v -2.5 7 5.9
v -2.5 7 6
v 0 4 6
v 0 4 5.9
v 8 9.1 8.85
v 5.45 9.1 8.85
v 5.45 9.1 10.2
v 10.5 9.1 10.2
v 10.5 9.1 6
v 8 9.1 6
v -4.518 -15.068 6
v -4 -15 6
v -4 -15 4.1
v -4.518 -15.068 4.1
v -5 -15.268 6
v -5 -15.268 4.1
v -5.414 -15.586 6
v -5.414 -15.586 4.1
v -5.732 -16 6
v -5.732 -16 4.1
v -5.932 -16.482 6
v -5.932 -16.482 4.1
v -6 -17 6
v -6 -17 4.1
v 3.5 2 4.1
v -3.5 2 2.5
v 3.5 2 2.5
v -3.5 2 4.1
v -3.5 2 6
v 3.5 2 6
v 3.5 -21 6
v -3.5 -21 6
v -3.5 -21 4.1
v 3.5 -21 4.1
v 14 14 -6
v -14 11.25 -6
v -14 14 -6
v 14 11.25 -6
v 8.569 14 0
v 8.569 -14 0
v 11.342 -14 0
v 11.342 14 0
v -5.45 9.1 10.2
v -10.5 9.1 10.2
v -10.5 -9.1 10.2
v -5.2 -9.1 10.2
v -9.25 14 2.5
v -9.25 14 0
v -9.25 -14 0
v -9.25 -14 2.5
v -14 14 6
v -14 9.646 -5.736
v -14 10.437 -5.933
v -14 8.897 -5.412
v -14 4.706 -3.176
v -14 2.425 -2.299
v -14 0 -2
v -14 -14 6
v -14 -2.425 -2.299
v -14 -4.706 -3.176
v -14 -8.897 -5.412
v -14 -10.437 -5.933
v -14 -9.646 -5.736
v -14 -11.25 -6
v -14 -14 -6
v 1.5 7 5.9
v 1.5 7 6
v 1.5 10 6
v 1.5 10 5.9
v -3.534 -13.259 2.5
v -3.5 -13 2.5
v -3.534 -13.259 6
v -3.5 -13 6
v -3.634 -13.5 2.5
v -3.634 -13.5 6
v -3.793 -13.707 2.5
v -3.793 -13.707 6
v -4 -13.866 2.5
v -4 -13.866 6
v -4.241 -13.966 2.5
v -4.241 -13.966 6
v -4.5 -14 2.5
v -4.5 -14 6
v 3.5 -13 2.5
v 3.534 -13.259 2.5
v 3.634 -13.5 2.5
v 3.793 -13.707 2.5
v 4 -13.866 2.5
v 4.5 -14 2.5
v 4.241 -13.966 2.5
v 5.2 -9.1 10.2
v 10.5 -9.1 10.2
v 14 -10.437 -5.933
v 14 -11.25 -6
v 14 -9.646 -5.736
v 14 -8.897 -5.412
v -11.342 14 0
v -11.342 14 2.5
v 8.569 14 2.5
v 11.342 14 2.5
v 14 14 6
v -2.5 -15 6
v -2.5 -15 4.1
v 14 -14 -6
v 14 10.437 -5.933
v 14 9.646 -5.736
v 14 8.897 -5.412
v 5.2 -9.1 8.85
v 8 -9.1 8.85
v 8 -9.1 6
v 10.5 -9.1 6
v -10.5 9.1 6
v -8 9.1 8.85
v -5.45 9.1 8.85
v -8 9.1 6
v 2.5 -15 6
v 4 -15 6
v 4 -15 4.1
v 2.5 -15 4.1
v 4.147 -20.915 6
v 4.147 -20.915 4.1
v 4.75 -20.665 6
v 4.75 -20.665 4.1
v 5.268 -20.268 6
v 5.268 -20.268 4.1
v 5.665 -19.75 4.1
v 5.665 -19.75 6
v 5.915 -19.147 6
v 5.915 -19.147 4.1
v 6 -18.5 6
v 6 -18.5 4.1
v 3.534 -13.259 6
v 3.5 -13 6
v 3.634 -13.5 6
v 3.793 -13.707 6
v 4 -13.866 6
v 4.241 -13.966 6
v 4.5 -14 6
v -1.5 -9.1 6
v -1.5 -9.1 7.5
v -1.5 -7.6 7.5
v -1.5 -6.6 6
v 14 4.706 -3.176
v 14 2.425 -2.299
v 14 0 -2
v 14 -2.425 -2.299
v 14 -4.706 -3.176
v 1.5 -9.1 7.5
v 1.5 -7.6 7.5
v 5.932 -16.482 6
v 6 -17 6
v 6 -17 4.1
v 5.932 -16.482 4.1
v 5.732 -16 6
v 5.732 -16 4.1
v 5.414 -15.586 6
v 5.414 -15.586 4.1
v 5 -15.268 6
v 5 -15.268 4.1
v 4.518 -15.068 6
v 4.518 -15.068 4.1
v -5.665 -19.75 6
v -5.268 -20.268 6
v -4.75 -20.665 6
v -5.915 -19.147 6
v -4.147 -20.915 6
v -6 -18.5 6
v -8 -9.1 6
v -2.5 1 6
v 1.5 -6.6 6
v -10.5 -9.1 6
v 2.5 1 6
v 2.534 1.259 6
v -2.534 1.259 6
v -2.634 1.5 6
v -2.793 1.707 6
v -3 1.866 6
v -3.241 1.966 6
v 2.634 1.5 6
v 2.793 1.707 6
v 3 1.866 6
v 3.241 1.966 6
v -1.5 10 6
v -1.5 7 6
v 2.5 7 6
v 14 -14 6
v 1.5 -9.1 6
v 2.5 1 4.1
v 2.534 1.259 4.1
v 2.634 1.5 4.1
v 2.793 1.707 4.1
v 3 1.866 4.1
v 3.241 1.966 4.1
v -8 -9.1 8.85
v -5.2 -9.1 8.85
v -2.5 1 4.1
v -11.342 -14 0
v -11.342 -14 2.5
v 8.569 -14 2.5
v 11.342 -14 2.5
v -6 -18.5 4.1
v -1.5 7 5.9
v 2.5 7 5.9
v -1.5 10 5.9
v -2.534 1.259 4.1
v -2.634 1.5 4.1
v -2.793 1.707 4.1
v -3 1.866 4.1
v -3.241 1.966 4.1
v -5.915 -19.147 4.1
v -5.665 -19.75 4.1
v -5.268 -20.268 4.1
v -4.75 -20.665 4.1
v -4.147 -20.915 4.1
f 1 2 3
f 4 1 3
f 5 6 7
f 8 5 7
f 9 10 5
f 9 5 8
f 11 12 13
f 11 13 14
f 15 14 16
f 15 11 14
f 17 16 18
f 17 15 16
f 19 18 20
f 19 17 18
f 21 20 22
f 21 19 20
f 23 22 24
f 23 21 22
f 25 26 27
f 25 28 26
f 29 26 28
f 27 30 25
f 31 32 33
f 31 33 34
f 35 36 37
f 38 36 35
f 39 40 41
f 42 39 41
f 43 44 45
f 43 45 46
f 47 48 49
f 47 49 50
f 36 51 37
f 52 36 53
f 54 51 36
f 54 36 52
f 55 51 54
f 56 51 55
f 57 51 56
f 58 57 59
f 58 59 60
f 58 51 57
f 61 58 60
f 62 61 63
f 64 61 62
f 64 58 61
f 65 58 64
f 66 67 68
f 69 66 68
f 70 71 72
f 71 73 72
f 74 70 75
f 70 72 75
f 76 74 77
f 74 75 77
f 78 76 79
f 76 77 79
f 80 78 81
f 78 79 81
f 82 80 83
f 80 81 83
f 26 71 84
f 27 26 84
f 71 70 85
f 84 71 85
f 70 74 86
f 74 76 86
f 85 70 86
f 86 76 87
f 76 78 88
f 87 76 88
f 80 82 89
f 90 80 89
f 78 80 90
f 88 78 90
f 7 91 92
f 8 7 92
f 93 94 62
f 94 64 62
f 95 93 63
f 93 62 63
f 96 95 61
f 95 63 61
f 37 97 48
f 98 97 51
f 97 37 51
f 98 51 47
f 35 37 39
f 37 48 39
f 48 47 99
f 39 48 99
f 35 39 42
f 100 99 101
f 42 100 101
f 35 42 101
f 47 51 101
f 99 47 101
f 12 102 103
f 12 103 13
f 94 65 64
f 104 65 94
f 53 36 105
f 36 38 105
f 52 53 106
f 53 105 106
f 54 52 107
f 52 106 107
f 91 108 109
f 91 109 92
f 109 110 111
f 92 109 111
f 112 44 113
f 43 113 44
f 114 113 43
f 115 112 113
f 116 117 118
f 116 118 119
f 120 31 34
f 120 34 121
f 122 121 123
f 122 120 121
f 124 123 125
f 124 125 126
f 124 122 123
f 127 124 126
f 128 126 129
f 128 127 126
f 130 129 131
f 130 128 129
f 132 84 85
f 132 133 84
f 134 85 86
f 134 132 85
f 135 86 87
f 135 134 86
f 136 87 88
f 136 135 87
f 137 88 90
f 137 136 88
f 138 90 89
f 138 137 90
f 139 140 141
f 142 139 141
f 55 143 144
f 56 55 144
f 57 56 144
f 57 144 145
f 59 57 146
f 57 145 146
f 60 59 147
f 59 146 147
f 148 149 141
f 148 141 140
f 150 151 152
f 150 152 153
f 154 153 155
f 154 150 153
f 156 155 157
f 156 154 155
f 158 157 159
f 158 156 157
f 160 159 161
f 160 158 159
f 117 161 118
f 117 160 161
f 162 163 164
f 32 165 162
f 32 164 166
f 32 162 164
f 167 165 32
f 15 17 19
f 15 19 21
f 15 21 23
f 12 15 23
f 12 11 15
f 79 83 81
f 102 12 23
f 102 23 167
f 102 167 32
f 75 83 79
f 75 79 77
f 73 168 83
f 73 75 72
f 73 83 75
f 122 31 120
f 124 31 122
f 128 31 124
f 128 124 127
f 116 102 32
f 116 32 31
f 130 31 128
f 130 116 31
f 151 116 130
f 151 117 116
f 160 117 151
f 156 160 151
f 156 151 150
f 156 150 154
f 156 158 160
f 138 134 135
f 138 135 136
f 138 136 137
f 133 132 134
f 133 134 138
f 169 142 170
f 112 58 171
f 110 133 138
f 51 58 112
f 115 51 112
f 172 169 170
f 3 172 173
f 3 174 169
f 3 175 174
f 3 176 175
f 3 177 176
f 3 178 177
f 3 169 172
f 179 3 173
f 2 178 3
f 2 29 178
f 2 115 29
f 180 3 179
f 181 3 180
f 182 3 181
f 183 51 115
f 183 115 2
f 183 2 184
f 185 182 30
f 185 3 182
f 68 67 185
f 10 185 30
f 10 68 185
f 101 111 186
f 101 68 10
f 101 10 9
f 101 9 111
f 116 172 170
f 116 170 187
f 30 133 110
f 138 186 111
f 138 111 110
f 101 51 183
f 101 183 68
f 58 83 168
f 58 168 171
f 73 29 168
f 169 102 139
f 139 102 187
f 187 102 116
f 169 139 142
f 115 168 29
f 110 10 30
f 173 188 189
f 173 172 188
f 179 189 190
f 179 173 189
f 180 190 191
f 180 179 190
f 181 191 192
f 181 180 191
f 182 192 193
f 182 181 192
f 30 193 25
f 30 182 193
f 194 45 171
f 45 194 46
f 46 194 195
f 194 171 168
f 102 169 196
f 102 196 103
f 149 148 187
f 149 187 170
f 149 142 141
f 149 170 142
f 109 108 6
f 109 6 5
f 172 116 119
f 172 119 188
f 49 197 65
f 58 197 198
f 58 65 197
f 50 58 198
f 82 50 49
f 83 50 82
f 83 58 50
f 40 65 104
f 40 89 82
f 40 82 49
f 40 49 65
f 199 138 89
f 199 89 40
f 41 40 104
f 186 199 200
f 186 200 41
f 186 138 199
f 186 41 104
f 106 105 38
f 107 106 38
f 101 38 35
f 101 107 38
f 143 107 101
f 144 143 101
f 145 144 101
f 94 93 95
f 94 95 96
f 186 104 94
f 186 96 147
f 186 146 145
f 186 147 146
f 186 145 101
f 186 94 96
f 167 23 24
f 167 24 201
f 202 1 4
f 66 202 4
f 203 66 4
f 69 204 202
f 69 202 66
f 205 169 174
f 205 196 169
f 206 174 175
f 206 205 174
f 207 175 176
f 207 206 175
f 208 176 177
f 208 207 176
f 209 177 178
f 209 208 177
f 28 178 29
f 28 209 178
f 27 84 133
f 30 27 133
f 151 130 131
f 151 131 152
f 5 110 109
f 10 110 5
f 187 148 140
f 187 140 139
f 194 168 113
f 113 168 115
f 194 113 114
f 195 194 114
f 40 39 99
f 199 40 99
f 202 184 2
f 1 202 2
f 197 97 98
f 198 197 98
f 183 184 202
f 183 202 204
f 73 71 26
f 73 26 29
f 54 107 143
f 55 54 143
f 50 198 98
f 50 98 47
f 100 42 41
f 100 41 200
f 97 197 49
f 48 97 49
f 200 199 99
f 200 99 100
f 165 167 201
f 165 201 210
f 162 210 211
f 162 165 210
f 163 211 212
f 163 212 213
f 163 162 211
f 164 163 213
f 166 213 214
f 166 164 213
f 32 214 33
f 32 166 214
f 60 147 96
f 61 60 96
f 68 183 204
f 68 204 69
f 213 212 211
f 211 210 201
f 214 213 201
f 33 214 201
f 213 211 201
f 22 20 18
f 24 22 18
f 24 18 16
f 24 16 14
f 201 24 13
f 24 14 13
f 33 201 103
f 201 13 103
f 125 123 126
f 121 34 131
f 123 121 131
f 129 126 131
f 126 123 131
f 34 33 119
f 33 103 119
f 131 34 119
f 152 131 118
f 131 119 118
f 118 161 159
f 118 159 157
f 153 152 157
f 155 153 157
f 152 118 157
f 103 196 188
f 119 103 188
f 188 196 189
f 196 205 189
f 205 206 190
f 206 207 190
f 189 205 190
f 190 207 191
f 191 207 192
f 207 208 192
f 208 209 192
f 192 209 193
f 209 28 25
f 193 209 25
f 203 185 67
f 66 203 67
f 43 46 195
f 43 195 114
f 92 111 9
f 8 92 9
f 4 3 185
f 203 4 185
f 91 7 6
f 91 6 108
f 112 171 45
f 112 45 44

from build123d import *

# Parameters (mm, degrees)
F1_DEPTH  = 14
F3_W      = 7
F3_H      = 3.5
F4_DEPTH  = 16
F5_W      = 5
F5_H      = 0.4111507442
F5_H_2    = 17
F6_DEPTH  = 1.9
F8_R      = 0.99999
F10_DEPTH = 1.5
F11_W     = 2.5
F11_H     = 18.2
F12_DEPTH = 4.2
F13_W     = 2.5
F13_H     = 18.2
F14_DEPTH = 1.35
F15_W     = 3
F15_H     = 3
F16_DEPTH = 0.1
F17_DEPTH = 15
F18_R     = 5
F19_W     = 2.0917450339
F19_H     = 2.5
F20_DEPTH = 28.001
F19_W_2   = 2.772427164
F21_DEPTH = 28.001


# Not quite as in the source:
# - a fillet or chamfer is up to 0.001 mm smaller than in the source, because OpenCascade refuses the exact size
# - the program builds the solid bodies; features that only make, move or delete a surface that nothing else refers to are left out


with BuildPart() as f1:
    # F0 (on Front) → F1 (new body, symmetric)
    with BuildSketch(Plane.XZ):
        with BuildLine():
            Line((10, -6), (14, -6))
            Line((14, -6), (14, 6))
            Line((14, 6), (-14, 6))
            Line((-14, 6), (-14, -6))
            Line((-14, -6), (-10, -6))
            Line((-10, -6), (-4.7058823529, -3.1764705882))
            ThreePointArc((-4.7058823529, -3.1764705882), (0, -2), (4.7058823529, -3.1764705882))
            Line((4.7058823529, -3.1764705882), (10, -6))
        make_face()
        with BuildLine():
            Line((-10, -6), (10, -6))
            Line((10, -6), (4.7058823529, -3.1764705882))
            ThreePointArc((4.7058823529, -3.1764705882), (0, -2), (-4.7058823529, -3.1764705882))
            Line((-4.7058823529, -3.1764705882), (-10, -6))
        make_face()
    extrude(amount=F1_DEPTH, both=True)

    # F3 (on face) → F4 (cut)
    with BuildSketch(Plane.XZ.offset(14)):
        with Locations((0, 4.25)):
            Rectangle(F3_W, F3_H)
    extrude(amount=-F4_DEPTH, mode=Mode.SUBTRACT)

    # F5 (on face) → F6 (join)
    with BuildSketch(Plane.XY.offset(6)):
        with BuildLine():
            Line((2.5, -15), (-2.5, -15))
            Line((-2.5, -15), (-4, -15))
            ThreePointArc((-4, -15), (-5.4142135624, -15.5857864376), (-6, -17))
            Line((-6, -17), (-6, -18.5))
            ThreePointArc((-6, -18.5), (-5.267766953, -20.267766953), (-3.5, -21))
            Line((-3.5, -21), (3.5, -21))
            ThreePointArc((3.5, -21), (5.267766953, -20.267766953), (6, -18.5))
            Line((6, -18.5), (6, -17))
            ThreePointArc((6, -17), (5.4142135624, -15.5857864376), (4, -15))
            Line((4, -15), (2.5, -15))
        make_face()
        with Locations((0, 2.2055753721)):
            Rectangle(F5_W, F5_H)
        with Locations((0, -6.5)):
            Rectangle(F5_W, F5_H_2)
    extrude(amount=-F6_DEPTH)

    # F7: union 

    # F8 (radius 1 in the source; OpenCascade refuses exactly that, so slightly less here)
    f8_edges = [f1.edges().sort_by_distance(p)[0] for p in [
        (-3.5, -14, 4.25),
        (3.5, -14, 4.25),
        (2.5, 2, 5.05),
        (-2.5, 2, 5.05),
    ]]
    fillet(f8_edges, radius=F8_R)

    # F9 (on Right) → F10 (join, symmetric)
    with BuildSketch(Plane.YZ):
        Polygon((-6.6, 6), (-7.6, 7.5), (-9.1, 7.5), (-9.1, 6), align=None)
    extrude(amount=F10_DEPTH, both=True)

    # F11 (on face) → F12 (join)
    with BuildSketch(Plane.XY.offset(6)):
        with Locations((-9.25, 0)):
            Rectangle(F11_W, F11_H)
        with Locations((9.25, 0)):
            Rectangle(F11_W, F11_H)
    extrude(amount=F12_DEPTH)

    # F13 (on face) → F14 (join)
    with BuildSketch(Plane.XY.offset(10.2)):
        with Locations((-9.25, 0)):
            Rectangle(F13_W, F13_H)
        Polygon((-5.45, 9.1), (-8, 9.1), (-8, -9.1), (-5.2, -9.1), align=None)
        Polygon((5.45, 9.1), (5.2, -9.1), (10.5, -9.1), (10.5, 9.1), align=None)
    extrude(amount=-F14_DEPTH)

    # F15 (on face) → F16 (cut)
    with BuildSketch(Plane.XY.offset(6)):
        with Locations((0, 8.5)):
            Rectangle(F15_W, F15_H)
        Polygon((2.5, 7), (1.5, 7), (-1.5, 7), (-2.5, 7), (0, 4), align=None)
    extrude(amount=-F16_DEPTH, mode=Mode.SUBTRACT)

    # F2 (on Right) → F17 (cut, symmetric)
    with BuildSketch(Plane.YZ):
        with BuildLine():
            Line((-10, -6), (10, -6))
            Line((10, -6), (4.7058823529, -3.1764705882))
            ThreePointArc((4.7058823529, -3.1764705882), (0, -2), (-4.7058823529, -3.1764705882))
            Line((-4.7058823529, -3.1764705882), (-10, -6))
        make_face()
    extrude(amount=F17_DEPTH, both=True, mode=Mode.SUBTRACT)

    # F18
    f18_edges = [f1.edges().sort_by_distance(p)[0] for p in [
        (0, -10, -6),
        (0, 10, -6),
    ]]
    fillet(f18_edges, radius=F18_R)

    # F19 (on face) → F20 (cut, through all)
    with BuildSketch(Plane.XZ.offset(14)):
        with Locations((-10.2958725169, 1.25)):
            Rectangle(F19_W, F19_H)
    extrude(amount=-F20_DEPTH, mode=Mode.SUBTRACT)

    # F19 (on face) → F21 (cut, through all)
    with BuildSketch(Plane.XZ.offset(14)):
        with Locations((-10.2958725169, 1.25)):
            Rectangle(F19_W, F19_H)
        with Locations((9.9555305205, 1.25)):
            Rectangle(F19_W_2, F19_H)
    extrude(amount=-F21_DEPTH, mode=Mode.SUBTRACT)


solid = f1.part
